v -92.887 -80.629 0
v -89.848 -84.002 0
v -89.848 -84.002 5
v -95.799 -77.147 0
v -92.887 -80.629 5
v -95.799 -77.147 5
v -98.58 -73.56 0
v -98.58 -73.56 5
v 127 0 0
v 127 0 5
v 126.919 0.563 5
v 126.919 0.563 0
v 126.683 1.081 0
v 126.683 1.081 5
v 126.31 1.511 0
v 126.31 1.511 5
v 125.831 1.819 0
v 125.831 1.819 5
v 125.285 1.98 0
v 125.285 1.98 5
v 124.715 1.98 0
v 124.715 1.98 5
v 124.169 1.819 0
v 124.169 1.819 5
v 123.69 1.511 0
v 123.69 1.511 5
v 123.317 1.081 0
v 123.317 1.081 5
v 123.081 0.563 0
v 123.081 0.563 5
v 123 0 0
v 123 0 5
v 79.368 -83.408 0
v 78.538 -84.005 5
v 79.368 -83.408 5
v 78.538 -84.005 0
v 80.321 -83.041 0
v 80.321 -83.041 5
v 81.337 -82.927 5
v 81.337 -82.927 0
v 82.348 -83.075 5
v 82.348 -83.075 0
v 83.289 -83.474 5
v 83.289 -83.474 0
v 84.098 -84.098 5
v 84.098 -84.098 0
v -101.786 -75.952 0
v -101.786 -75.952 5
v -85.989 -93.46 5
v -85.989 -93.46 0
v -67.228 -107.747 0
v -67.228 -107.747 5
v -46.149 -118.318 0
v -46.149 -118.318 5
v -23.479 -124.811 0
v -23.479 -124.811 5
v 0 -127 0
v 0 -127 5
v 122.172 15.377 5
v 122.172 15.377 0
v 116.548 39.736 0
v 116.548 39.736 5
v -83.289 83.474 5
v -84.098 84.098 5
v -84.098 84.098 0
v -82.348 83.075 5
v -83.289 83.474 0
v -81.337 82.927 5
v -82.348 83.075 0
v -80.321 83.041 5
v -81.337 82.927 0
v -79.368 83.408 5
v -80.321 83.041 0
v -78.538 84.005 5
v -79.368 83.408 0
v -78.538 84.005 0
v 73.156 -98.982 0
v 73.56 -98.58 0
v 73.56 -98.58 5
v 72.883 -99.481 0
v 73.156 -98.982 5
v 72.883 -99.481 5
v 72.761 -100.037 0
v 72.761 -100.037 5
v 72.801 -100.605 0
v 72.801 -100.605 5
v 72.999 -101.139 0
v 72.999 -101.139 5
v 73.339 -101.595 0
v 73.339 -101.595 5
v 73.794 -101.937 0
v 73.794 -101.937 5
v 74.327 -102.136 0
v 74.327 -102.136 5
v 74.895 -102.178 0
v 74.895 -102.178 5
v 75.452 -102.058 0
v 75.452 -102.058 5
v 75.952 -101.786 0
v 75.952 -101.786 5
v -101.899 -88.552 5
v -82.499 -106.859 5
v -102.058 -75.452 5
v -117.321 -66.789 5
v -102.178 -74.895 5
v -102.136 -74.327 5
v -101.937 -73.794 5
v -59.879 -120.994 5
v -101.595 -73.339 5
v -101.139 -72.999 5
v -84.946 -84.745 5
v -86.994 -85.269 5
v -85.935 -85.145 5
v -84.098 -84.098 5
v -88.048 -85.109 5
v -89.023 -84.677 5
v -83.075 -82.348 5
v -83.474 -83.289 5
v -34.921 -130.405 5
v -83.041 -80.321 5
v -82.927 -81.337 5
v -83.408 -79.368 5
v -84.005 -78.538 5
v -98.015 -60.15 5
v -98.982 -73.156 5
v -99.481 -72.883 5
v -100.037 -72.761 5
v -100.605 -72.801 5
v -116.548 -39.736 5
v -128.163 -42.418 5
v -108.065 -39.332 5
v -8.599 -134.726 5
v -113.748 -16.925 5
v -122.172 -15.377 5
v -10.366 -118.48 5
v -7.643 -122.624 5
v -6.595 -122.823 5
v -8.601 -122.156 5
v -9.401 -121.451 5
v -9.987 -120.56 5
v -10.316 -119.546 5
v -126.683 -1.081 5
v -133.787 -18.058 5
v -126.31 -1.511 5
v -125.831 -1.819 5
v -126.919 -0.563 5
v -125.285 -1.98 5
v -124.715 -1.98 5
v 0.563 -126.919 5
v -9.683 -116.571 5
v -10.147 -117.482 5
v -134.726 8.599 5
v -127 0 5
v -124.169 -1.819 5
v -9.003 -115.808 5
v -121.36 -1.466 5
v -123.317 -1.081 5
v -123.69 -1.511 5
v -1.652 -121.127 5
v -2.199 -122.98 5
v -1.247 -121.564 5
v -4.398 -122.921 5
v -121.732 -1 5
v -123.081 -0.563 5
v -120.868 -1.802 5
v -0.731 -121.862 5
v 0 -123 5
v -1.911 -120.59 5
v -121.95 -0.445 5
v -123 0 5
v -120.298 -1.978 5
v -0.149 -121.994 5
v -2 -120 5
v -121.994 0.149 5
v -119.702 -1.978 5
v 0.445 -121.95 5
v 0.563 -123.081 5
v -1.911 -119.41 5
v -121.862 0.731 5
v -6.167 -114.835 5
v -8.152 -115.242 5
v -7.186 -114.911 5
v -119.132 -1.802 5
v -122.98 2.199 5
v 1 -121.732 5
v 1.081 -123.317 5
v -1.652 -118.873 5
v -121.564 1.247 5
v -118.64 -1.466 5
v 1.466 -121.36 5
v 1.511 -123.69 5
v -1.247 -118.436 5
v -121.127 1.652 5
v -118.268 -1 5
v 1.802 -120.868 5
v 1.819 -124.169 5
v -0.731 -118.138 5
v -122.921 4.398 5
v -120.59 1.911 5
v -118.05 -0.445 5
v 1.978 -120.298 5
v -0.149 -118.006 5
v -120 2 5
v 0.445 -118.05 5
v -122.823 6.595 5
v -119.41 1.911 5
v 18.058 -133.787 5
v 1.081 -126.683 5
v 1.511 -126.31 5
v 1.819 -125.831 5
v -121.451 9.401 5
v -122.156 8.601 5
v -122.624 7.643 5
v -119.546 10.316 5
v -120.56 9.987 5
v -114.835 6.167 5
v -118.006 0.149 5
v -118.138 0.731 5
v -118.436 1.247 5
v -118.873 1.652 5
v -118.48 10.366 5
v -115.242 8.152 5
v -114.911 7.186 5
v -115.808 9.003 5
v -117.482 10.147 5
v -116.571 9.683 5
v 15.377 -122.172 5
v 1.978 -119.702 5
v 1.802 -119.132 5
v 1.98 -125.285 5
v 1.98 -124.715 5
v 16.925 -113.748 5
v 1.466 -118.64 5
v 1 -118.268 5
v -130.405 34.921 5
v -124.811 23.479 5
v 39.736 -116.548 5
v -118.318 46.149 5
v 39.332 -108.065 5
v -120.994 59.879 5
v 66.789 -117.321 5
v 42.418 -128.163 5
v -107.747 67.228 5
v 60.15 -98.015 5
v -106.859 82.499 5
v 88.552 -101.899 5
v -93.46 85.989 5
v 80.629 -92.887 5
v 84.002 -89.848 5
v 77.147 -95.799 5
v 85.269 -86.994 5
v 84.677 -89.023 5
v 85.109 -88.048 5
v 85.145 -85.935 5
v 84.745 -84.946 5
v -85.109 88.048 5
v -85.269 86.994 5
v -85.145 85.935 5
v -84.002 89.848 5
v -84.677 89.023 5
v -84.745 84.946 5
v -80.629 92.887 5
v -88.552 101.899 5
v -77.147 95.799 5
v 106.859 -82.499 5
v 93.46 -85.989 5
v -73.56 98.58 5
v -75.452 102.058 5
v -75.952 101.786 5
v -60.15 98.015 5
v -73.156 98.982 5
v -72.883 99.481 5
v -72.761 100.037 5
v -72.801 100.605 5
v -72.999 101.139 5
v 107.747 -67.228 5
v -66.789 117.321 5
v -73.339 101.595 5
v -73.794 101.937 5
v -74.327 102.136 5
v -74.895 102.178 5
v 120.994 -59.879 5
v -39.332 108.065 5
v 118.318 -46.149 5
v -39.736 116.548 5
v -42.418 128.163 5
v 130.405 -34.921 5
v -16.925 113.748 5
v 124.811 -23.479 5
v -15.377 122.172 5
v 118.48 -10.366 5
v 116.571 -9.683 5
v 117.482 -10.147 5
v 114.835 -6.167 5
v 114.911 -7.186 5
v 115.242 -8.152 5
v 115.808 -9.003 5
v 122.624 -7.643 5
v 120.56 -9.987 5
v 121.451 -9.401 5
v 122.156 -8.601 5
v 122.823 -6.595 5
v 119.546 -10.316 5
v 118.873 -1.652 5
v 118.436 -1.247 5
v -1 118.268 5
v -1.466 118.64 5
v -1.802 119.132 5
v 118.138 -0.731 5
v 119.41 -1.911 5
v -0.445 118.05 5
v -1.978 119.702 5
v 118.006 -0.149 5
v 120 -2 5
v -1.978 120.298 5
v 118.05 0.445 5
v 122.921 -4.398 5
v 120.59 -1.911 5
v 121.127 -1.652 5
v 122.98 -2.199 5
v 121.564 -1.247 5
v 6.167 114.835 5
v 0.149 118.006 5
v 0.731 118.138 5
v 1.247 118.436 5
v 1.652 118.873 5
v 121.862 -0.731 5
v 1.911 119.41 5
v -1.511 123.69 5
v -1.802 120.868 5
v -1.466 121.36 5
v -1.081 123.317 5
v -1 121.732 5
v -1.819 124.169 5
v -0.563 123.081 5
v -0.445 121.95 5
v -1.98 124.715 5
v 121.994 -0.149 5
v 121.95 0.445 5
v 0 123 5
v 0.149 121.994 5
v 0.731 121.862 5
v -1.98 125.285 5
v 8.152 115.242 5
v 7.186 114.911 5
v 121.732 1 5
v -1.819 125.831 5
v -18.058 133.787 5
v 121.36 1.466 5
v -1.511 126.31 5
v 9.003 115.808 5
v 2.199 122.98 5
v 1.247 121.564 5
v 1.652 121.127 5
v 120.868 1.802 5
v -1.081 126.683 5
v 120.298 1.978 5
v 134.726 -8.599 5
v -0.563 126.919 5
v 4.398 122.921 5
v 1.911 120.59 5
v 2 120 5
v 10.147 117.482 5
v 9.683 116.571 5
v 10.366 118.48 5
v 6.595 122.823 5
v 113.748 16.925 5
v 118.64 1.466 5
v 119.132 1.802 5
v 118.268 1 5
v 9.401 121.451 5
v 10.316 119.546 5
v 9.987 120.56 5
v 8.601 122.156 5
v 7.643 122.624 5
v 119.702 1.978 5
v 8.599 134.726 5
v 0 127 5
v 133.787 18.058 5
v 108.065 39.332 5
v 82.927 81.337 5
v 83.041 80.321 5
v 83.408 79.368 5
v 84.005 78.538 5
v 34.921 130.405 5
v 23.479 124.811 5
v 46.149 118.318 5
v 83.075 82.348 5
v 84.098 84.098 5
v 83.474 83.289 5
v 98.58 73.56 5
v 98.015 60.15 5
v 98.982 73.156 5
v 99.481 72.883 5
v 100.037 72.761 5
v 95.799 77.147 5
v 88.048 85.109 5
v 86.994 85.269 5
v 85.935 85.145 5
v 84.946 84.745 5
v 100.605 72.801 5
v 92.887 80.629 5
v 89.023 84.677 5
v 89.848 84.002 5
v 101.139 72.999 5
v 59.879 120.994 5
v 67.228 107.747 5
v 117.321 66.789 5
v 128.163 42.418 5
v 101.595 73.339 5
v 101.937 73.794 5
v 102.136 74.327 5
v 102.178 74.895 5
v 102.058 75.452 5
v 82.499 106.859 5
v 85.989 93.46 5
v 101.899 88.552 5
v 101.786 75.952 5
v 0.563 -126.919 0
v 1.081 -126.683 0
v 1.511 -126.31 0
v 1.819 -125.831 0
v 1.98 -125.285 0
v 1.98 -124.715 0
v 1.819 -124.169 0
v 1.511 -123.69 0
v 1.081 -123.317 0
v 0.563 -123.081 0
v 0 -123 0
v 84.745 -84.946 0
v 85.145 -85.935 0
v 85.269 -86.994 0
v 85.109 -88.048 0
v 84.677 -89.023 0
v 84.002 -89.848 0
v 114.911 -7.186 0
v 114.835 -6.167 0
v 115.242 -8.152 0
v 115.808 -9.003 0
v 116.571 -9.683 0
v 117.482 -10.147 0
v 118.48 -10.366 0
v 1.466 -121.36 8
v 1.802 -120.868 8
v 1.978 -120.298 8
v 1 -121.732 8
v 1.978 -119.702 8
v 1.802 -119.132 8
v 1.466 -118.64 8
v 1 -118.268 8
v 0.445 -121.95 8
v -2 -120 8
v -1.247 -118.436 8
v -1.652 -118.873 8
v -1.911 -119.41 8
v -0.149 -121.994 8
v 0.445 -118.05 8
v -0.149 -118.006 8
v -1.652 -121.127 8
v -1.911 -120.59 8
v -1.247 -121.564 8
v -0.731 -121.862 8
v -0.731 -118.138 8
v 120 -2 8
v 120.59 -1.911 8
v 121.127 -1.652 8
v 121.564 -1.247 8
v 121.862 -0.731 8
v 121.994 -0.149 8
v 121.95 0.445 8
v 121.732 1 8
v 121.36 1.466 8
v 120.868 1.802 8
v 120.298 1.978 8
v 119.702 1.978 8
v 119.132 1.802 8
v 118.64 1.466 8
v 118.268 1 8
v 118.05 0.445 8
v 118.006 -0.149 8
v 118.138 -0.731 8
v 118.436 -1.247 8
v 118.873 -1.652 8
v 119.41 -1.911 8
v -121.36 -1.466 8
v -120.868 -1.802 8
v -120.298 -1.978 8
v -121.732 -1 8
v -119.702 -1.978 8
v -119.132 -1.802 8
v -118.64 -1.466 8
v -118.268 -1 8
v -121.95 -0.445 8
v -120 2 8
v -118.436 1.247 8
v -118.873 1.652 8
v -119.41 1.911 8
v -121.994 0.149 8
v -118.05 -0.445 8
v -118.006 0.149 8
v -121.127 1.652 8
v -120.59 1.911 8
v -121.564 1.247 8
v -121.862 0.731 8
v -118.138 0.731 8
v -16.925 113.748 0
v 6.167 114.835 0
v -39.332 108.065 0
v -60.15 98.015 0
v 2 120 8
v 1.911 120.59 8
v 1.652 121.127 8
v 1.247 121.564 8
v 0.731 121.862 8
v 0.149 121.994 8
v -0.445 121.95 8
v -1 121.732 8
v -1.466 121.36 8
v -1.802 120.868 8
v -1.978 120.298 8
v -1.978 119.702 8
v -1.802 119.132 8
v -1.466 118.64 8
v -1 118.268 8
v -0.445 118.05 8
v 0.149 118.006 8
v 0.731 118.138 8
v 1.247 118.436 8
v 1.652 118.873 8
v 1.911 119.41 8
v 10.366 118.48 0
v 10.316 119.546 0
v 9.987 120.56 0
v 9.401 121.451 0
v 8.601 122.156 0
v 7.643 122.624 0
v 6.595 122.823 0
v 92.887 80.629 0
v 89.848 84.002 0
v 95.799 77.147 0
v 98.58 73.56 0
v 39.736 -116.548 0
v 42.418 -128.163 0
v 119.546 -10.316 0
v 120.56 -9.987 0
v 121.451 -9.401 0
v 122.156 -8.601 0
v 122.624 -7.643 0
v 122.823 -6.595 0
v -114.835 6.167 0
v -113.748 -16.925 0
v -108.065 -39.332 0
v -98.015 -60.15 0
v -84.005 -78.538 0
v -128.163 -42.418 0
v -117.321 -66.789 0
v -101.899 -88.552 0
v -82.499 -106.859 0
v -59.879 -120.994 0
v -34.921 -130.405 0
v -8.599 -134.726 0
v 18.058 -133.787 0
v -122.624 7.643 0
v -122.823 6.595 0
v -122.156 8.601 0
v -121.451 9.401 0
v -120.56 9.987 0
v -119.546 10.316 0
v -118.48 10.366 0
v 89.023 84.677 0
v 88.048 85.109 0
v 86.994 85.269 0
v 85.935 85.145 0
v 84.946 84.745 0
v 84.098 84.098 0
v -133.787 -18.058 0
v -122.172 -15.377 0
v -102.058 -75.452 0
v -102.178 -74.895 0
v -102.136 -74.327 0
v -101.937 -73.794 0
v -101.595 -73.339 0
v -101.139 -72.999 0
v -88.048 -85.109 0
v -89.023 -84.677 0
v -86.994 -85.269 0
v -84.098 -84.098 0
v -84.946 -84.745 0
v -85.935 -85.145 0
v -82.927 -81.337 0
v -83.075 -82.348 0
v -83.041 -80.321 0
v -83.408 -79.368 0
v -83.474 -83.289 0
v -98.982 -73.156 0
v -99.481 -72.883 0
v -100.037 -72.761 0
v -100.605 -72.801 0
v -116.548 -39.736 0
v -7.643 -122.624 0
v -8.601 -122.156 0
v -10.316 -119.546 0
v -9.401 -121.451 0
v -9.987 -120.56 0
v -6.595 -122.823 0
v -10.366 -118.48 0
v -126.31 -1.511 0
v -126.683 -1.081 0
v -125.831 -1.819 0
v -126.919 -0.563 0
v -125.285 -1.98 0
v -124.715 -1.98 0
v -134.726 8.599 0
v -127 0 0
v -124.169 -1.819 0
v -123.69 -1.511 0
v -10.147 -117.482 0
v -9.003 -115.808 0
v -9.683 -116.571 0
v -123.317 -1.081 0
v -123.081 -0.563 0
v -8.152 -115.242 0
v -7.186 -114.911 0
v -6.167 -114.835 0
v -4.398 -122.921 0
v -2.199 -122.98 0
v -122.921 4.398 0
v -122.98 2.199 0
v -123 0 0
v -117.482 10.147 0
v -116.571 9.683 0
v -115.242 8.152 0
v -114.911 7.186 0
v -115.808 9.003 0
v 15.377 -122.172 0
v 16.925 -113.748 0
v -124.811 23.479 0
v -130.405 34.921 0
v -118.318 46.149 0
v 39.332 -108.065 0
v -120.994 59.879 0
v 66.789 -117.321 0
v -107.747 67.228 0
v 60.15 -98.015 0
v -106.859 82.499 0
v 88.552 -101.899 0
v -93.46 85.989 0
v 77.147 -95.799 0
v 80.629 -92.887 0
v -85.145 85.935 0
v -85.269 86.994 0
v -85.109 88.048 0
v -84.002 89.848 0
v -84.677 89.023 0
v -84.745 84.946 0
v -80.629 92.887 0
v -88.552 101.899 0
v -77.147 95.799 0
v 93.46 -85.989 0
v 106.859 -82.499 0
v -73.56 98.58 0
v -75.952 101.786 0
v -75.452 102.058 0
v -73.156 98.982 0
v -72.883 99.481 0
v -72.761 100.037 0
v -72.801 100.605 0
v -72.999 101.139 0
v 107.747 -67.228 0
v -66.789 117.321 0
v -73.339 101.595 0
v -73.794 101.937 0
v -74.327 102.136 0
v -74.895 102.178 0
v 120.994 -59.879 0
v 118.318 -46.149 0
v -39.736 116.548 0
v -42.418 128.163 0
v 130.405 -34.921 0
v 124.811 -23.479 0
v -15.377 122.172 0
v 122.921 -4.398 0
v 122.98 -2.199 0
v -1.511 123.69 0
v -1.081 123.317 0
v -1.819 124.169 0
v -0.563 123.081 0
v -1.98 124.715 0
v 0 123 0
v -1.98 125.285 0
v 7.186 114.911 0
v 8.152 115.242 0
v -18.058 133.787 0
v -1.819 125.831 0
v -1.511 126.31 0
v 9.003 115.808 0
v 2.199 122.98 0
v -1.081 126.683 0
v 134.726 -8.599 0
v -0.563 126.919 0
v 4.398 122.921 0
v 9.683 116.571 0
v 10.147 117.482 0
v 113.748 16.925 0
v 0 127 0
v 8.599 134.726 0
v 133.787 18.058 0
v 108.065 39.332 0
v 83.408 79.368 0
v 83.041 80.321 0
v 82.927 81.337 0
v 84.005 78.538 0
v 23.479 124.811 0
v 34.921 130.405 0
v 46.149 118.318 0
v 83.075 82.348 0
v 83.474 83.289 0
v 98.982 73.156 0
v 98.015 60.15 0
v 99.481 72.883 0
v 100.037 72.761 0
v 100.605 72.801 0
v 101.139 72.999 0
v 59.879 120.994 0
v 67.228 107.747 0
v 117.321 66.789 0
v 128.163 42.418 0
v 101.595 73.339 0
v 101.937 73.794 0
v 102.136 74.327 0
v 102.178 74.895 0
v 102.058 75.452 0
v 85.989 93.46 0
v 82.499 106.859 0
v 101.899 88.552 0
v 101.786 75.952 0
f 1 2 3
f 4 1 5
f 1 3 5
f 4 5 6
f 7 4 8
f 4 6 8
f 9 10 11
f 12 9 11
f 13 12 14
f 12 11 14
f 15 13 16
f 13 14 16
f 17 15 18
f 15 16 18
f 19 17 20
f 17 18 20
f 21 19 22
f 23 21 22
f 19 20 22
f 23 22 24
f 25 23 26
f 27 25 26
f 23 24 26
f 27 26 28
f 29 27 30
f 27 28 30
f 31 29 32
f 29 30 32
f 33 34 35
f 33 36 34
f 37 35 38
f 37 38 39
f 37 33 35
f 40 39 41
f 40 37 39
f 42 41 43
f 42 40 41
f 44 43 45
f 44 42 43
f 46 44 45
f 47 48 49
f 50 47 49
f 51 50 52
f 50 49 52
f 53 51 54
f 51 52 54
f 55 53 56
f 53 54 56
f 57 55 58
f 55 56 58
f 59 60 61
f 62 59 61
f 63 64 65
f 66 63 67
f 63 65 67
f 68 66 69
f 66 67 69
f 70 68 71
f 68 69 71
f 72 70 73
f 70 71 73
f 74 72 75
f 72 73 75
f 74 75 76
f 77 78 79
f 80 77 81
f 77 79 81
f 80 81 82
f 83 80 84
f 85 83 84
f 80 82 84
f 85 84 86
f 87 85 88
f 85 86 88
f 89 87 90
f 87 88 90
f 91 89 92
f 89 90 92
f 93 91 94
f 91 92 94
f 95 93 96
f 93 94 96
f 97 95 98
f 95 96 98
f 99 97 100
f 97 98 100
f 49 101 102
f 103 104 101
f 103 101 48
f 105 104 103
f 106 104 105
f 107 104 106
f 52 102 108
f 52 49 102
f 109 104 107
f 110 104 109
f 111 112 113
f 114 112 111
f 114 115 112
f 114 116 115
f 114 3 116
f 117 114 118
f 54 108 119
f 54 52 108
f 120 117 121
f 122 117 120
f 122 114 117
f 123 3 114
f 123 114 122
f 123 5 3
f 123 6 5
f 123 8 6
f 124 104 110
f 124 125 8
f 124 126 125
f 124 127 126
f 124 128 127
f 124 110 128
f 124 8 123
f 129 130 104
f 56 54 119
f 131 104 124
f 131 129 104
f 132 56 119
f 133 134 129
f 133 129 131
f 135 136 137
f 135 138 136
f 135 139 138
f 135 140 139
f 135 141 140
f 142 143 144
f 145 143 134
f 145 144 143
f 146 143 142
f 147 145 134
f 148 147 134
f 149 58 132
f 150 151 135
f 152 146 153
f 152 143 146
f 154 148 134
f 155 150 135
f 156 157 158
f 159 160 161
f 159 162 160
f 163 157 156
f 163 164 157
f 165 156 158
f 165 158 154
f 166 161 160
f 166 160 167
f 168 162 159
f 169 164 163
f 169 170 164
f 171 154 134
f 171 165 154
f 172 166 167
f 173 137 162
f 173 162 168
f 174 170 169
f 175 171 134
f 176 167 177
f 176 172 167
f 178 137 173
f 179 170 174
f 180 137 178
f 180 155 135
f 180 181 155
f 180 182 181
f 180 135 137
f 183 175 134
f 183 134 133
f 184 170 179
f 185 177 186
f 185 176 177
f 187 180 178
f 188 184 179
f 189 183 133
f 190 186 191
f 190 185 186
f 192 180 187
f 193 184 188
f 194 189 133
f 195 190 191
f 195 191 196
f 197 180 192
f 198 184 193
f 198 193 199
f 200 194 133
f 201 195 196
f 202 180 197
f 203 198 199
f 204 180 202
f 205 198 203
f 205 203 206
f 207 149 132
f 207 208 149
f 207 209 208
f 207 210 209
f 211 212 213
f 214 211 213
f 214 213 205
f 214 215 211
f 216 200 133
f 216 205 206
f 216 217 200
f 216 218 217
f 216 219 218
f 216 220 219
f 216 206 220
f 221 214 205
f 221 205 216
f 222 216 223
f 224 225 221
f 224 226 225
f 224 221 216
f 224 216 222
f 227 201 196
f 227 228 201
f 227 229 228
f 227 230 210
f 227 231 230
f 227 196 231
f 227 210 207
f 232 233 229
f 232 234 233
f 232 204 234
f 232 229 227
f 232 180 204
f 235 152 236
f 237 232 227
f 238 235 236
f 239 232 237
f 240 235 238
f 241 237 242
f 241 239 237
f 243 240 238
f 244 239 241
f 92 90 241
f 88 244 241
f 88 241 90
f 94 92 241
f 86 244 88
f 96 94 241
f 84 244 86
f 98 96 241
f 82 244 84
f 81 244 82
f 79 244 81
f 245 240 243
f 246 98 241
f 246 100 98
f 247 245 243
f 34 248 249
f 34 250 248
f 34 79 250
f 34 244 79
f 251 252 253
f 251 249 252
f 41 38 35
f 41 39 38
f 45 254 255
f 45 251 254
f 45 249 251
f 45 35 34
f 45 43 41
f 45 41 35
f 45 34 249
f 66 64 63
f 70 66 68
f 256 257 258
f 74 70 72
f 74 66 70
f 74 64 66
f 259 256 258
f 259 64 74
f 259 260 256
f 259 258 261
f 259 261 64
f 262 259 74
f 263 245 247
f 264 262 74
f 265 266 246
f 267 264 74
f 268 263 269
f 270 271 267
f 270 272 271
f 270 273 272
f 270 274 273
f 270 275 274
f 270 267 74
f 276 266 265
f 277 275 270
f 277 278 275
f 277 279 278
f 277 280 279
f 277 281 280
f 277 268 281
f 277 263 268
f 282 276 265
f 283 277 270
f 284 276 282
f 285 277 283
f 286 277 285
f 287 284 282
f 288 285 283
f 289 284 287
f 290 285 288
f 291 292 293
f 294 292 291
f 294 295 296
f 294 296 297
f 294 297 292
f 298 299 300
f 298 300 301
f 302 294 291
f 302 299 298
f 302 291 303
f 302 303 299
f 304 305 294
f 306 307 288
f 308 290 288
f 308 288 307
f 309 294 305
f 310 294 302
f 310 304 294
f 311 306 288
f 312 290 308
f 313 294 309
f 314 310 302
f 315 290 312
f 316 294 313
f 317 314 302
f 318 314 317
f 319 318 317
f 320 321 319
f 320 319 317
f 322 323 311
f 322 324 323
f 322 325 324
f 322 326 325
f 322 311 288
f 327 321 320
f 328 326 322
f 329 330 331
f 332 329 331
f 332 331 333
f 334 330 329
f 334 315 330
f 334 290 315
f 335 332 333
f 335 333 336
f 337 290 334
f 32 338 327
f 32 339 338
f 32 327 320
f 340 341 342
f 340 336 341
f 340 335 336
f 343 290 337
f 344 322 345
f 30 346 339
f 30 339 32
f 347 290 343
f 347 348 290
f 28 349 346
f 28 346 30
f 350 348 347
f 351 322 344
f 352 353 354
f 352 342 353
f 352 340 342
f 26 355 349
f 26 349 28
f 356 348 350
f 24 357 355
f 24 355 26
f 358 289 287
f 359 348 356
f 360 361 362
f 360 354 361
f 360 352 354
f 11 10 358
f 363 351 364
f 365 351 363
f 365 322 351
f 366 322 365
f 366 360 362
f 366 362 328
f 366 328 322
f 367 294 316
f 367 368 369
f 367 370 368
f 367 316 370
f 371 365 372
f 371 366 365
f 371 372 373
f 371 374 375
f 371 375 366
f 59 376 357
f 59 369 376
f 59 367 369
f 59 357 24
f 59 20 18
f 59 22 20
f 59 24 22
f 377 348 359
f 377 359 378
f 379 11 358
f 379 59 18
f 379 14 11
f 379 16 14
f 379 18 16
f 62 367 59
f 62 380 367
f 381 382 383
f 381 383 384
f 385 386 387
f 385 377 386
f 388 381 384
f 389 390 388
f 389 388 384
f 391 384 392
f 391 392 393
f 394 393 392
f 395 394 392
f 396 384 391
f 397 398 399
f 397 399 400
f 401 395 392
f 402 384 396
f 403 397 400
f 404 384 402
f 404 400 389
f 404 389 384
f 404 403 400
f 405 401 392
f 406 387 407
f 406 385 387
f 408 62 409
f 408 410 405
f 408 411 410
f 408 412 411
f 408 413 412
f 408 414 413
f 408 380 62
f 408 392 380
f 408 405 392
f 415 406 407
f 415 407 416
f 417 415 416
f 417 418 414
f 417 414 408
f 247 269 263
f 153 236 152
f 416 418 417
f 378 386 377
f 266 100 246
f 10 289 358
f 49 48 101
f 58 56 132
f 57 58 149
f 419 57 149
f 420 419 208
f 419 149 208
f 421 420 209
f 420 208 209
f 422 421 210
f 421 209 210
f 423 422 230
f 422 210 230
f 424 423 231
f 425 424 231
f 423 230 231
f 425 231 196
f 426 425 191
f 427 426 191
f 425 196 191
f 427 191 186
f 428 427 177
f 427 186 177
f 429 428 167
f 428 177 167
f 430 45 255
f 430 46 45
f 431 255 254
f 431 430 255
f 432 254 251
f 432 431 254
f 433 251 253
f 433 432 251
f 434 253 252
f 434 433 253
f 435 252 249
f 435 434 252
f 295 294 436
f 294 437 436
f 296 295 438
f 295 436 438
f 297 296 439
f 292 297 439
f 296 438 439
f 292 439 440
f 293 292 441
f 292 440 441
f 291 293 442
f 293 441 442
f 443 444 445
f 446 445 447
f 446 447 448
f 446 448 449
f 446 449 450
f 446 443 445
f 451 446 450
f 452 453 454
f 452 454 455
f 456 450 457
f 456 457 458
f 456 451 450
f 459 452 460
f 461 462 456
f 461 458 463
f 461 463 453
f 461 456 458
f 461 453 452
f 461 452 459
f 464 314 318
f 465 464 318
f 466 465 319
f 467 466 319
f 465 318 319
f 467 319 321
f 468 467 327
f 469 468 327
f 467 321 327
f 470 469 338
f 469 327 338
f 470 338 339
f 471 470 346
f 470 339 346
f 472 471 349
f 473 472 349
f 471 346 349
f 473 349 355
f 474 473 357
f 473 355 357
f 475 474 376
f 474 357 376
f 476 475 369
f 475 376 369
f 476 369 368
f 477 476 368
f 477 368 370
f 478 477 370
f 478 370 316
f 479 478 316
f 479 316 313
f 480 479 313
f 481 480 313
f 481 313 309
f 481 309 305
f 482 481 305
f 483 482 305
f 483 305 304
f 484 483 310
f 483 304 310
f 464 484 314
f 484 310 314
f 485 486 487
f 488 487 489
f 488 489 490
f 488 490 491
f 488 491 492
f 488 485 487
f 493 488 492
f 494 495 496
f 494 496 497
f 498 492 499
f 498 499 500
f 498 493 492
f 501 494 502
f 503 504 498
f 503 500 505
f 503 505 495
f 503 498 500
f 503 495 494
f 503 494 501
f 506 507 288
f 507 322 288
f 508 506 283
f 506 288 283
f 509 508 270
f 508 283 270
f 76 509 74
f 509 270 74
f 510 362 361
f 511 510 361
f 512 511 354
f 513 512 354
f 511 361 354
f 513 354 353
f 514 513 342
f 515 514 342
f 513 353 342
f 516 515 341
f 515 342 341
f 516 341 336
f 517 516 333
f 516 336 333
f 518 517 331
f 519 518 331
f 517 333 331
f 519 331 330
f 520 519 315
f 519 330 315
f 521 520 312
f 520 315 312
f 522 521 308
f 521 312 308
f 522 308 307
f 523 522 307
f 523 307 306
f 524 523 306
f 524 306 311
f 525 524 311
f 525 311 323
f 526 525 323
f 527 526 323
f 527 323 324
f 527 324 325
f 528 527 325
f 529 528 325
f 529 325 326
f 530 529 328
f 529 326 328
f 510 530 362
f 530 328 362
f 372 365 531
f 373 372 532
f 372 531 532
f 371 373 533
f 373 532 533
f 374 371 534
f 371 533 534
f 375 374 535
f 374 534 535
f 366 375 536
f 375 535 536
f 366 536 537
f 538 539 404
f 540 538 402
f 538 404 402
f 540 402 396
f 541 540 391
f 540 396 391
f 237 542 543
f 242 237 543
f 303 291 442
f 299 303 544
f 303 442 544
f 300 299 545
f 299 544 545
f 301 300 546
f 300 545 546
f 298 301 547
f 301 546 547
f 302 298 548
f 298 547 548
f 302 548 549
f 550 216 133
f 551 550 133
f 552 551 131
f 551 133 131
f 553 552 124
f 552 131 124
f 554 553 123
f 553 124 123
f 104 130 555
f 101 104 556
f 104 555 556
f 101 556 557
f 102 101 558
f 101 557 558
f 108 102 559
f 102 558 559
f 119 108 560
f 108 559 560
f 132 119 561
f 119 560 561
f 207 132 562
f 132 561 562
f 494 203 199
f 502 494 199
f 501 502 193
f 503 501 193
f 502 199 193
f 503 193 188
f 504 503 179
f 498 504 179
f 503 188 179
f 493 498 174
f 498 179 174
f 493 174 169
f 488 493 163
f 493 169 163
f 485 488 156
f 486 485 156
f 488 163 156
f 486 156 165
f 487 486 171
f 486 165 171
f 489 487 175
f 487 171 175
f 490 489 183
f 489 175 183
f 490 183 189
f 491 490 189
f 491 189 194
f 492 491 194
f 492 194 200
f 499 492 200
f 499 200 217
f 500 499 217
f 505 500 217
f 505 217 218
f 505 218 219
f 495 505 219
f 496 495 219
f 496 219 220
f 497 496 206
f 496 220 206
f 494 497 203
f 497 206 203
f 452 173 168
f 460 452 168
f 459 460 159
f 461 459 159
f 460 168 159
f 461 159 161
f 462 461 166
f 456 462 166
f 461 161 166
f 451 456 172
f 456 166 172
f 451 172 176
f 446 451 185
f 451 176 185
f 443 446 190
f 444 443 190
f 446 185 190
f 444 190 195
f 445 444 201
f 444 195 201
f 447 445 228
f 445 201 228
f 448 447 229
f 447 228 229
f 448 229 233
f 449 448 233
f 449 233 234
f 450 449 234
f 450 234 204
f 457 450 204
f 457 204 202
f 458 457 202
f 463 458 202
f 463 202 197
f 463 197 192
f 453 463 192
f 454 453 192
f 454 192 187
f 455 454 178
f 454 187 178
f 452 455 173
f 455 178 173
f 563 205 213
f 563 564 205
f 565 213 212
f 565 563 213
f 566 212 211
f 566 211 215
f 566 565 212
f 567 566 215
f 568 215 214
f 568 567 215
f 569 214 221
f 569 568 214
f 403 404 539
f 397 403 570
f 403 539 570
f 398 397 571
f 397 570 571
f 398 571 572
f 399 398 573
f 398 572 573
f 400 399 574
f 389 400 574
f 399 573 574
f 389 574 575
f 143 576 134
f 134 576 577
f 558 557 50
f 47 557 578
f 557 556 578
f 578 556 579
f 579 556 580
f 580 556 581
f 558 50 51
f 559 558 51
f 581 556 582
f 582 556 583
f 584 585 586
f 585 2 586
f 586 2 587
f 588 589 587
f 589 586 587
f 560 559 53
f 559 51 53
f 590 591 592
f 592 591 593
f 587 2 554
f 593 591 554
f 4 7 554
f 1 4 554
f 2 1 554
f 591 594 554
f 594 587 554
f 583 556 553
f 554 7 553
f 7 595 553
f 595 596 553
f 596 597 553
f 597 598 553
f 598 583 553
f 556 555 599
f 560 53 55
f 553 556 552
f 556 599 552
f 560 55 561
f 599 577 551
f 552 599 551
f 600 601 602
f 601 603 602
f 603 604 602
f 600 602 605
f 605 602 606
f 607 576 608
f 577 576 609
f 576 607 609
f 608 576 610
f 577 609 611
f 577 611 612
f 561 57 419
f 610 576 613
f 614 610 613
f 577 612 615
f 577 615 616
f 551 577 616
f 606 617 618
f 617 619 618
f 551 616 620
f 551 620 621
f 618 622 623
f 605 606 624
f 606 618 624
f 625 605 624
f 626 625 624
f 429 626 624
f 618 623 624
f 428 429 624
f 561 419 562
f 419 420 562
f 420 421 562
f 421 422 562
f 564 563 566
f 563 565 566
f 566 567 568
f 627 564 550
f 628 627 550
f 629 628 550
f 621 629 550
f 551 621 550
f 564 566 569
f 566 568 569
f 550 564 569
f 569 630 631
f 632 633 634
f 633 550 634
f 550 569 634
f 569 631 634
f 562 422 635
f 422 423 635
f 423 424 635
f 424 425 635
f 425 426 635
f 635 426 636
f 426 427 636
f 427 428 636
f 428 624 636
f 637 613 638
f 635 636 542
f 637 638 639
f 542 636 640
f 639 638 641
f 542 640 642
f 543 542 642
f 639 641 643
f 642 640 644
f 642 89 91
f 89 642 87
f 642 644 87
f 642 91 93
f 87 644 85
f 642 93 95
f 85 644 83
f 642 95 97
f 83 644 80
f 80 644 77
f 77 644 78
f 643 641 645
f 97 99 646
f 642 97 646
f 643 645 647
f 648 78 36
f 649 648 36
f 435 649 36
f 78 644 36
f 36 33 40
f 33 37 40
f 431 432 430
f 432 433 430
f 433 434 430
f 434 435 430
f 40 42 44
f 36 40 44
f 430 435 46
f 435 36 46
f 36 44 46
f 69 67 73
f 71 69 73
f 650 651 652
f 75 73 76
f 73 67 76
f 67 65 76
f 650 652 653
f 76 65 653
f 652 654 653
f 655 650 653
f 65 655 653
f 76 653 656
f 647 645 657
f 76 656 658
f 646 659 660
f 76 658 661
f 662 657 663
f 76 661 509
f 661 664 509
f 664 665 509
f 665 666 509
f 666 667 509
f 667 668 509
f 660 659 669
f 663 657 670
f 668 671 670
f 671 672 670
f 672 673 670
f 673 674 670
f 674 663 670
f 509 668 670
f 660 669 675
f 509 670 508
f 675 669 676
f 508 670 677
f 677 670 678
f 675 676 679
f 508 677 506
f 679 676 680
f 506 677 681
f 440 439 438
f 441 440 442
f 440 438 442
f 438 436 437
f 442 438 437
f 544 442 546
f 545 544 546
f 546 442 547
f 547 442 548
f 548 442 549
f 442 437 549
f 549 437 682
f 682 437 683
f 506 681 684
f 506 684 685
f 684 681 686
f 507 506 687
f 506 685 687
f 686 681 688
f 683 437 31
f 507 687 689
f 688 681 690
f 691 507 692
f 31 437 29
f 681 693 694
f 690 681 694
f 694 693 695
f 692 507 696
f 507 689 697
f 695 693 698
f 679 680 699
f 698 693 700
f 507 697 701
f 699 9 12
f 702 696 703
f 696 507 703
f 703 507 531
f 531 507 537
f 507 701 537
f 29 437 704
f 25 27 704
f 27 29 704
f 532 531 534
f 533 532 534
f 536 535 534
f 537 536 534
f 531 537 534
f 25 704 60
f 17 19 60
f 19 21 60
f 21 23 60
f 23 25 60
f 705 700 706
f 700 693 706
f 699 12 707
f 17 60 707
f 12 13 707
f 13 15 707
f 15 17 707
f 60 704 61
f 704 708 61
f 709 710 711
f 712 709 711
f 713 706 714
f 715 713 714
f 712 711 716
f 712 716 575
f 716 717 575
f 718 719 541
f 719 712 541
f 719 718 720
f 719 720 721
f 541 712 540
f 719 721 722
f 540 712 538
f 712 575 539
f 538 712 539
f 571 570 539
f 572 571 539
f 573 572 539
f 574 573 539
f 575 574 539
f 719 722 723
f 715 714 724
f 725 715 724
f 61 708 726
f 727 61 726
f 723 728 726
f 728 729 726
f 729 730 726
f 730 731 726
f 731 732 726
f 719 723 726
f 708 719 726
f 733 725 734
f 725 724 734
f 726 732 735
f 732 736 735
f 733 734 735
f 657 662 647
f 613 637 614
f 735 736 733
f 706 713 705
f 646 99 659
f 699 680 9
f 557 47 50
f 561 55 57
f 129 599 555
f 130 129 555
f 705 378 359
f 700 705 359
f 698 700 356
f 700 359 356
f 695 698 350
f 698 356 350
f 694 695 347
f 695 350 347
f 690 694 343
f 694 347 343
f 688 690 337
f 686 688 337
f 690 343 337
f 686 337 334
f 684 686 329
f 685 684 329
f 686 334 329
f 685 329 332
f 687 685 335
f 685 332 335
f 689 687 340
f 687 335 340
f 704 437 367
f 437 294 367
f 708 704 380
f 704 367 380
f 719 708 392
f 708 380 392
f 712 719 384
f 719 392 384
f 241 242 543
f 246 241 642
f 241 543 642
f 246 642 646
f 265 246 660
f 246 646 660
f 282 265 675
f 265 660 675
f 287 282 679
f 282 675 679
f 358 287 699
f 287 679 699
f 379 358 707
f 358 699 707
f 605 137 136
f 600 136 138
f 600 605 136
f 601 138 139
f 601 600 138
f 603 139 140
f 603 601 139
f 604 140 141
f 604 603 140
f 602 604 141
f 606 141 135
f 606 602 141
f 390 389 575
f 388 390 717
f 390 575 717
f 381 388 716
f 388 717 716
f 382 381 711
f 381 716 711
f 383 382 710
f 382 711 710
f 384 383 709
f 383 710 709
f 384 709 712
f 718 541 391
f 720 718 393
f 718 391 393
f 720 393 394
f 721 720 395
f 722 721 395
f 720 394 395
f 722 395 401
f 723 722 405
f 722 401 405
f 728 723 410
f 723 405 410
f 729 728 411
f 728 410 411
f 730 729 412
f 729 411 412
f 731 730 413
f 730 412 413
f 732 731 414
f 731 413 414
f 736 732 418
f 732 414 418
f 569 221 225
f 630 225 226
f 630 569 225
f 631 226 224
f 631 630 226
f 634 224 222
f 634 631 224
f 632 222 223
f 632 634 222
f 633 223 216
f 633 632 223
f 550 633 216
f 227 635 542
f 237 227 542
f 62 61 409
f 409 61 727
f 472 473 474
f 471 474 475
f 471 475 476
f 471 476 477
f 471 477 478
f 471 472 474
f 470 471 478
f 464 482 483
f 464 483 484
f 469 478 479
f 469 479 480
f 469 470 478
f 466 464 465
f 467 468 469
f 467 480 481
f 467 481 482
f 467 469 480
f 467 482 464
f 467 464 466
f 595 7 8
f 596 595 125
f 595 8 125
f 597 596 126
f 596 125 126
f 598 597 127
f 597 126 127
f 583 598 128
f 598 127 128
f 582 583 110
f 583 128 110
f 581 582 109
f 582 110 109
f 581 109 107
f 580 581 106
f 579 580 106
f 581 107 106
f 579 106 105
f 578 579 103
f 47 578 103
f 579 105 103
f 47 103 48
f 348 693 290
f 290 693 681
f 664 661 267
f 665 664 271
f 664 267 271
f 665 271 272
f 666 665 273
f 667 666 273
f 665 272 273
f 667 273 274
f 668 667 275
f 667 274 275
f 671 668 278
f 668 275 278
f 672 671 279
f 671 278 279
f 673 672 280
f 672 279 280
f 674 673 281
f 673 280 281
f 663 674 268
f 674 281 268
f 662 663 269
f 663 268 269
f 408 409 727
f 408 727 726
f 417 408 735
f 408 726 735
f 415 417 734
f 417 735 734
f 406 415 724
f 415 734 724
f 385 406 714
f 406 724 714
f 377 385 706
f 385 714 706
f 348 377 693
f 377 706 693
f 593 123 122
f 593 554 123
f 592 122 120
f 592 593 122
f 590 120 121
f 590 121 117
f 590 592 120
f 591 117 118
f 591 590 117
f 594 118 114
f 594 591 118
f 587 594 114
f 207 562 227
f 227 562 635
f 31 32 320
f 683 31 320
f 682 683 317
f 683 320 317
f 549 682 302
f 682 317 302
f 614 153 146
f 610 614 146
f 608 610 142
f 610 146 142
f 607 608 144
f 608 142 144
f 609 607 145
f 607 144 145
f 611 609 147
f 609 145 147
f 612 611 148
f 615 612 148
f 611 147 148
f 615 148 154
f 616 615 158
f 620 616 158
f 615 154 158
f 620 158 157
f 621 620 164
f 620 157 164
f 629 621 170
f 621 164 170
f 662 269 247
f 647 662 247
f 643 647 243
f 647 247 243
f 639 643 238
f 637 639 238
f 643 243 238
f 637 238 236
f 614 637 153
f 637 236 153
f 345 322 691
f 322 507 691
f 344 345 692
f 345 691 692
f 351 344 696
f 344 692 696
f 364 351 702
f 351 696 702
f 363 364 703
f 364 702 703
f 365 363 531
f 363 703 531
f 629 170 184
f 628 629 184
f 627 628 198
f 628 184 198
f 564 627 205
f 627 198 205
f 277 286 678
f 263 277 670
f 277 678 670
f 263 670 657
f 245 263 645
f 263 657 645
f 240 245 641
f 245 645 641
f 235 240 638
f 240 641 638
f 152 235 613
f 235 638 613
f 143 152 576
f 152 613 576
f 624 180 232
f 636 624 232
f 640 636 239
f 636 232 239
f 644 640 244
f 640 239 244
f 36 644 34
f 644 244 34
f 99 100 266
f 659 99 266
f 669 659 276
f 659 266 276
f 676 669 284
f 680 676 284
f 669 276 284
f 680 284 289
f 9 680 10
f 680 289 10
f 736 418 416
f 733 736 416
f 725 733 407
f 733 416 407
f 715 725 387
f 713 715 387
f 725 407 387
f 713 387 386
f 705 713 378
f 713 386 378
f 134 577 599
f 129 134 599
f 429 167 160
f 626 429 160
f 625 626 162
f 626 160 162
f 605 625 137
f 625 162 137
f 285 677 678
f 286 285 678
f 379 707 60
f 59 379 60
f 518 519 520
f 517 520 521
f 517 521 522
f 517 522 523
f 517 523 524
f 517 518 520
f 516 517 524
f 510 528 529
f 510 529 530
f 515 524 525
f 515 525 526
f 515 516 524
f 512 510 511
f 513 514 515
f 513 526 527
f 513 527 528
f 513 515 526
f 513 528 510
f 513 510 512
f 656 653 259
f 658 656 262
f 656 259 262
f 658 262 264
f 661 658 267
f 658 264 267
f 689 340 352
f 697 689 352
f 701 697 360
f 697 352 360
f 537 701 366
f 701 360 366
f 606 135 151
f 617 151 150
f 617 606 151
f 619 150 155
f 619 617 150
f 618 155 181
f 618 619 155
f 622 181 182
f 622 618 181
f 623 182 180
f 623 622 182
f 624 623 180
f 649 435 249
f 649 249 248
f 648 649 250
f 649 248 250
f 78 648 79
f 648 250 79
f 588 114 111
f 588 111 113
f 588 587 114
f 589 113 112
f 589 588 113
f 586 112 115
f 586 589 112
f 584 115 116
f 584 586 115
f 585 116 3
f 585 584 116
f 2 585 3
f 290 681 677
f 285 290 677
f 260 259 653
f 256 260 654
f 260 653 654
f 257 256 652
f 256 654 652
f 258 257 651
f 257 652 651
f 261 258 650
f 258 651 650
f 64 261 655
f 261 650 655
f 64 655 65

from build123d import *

# Parameters (mm, degrees)
SCHIZZO1_R                   = 135
ESTRUSIONE_ESTRUSIONE1_DEPTH = 5
SCHIZZO2_R                   = 115
TAGLIO_ESTRUSIONE1_DEPTH     = 191.984292548
SCHIZZO3_R                   = 2
ESTRUSIONE_ESTRUSIONE2_DEPTH = 3
RIPETIZIONECIRCOLARE1_COUNT  = 4
TAGLIO_ESTRUSIONE2_DEPTH     = 10
RIPETIZIONECIRCOLARE2_COUNT  = 4
TAGLIO_ESTRUSIONE21_DEPTH    = 8
RIPETIZIONECIRCOLARE3_COUNT  = 4
TAGLIO_ESTRUSIONE23_DEPTH    = 10
RIPETIZIONECIRCOLARE5_COUNT  = 4
RACCORDO1_R                  = 4
RACCORDO2_R                  = 4


with BuildPart() as part:
    # Schizzo1 → Estrusione-Estrusione1 (new body)
    with BuildSketch(Plane.XY):
        Circle(SCHIZZO1_R)
    extrude(amount=ESTRUSIONE_ESTRUSIONE1_DEPTH)

    # Schizzo2 → Taglio-Estrusione1 (cut, through all)
    with BuildSketch(Plane.XY.offset(5)):
        Circle(SCHIZZO2_R)
    extrude(amount=-TAGLIO_ESTRUSIONE1_DEPTH, mode=Mode.SUBTRACT)

    # Schizzo3 → Estrusione-Estrusione2 (add)
    with BuildSketch(Plane.XY.offset(5)):
        with Locations((0, 120)):
            Circle(SCHIZZO3_R)
    estrusione_estrusione2 = extrude(amount=ESTRUSIONE_ESTRUSIONE2_DEPTH)

    # RipetizioneCircolare1: Estrusione-Estrusione2 ×4 about axis
    ripetizionecircolare1_axis = Axis((0, 0, 0), (0, 0, 1))
    for i in range(1, RIPETIZIONECIRCOLARE1_COUNT):
        add(estrusione_estrusione2.rotate(ripetizionecircolare1_axis, i * 360 / RIPETIZIONECIRCOLARE1_COUNT))

    # Schizzo5 → Taglio-Estrusione2 (cut)
    with BuildSketch(Plane.XY.offset(5)):
        with BuildLine():
            ThreePointArc((-101.785752557, -75.95169897), (-56.934761924, -113.522829795), (0, -127))
            ThreePointArc((0, -127), (2, -125), (0, -123))
            ThreePointArc((0, -123), (-55.141541076, -109.947307596), (-98.579902083, -73.559519475))
            ThreePointArc((-98.579902083, -73.559519475), (-101.378917067, -73.152683985), (-101.785752557, -75.95169897))
        make_face()
    taglio_estrusione2 = extrude(amount=-TAGLIO_ESTRUSIONE2_DEPTH, mode=Mode.SUBTRACT)

    # RipetizioneCircolare2: Taglio-Estrusione2 ×4 about axis
    ripetizionecircolare2_axis = Axis((0, 0, 0), (0, 0, 1))
    for i in range(1, RIPETIZIONECIRCOLARE2_COUNT):
        add(taglio_estrusione2.rotate(ripetizionecircolare2_axis, i * 360 / RIPETIZIONECIRCOLARE2_COUNT), mode=Mode.SUBTRACT)

    # Schizzo14 → Taglio-Estrusione21 (cut)
    with BuildSketch(Plane.XY):
        Polygon((-39.736129967, 116.548444757), (-45.359906326, 140.907696377), (-21.000654706, 146.531472735), (-15.376878347, 122.172221115), align=None)
    taglio_estrusione21 = extrude(amount=TAGLIO_ESTRUSIONE21_DEPTH, mode=Mode.SUBTRACT)

    # RipetizioneCircolare3: Taglio-Estrusione21 ×4 about axis
    ripetizionecircolare3_axis = Axis((0, 0, 0), (0, 0, 1))
    for i in range(1, RIPETIZIONECIRCOLARE3_COUNT):
        add(taglio_estrusione21.rotate(ripetizionecircolare3_axis, i * 360 / RIPETIZIONECIRCOLARE3_COUNT), mode=Mode.SUBTRACT)

    # Schizzo15 → Taglio-Estrusione23 (cut)
    with BuildSketch(Plane.XY.offset(5)):
        with BuildLine():
            Line((-86.974134086, 86.974134086), (-81.317279836, 81.317279836))
            ThreePointArc((-81.317279836, 81.317279836), (-104.225395509, 48.6011001), (-114.562390281, 10.022910416))
            Line((-114.562390281, 10.022910416), (-122.531947865, 10.720156358))
            ThreePointArc((-122.531947865, 10.720156358), (-111.475857806, 51.982046194), (-86.974134086, 86.974134086))
        make_face()
    taglio_estrusione23 = extrude(amount=-TAGLIO_ESTRUSIONE23_DEPTH, mode=Mode.SUBTRACT)

    # RipetizioneCircolare5: Taglio-Estrusione23 ×4 about axis
    ripetizionecircolare5_axis = Axis((0, 0, 5), (0, 0, 1))
    for i in range(1, RIPETIZIONECIRCOLARE5_COUNT):
        add(taglio_estrusione23.rotate(ripetizionecircolare5_axis, i * 360 / RIPETIZIONECIRCOLARE5_COUNT), mode=Mode.SUBTRACT)

    # Raccordo1
    raccordo1_edges = [part.edges().sort_by_distance(p)[0] for p in [
        (-114.562390281, 10.022910416, 2.5),
        (-122.531947865, 10.720156358, 2.5),
    ]]
    fillet(raccordo1_edges, radius=RACCORDO1_R - 0.0001)  # a hair under: the kernel refuses the full size

    # Raccordo2
    raccordo2_edges = [part.edges().sort_by_distance(p)[0] for p in [
        (-81.317279836, -81.317279836, 2.5),
        (-86.974134086, -86.974134086, 2.5),
        (-10.022910416, -114.562390281, 2.5),
        (-10.720156358, -122.531947865, 2.5),
        (86.974134086, -86.974134086, 2.5),
        (81.317279836, -81.317279836, 2.5),
        (114.562390281, -10.022910416, 2.5),
        (122.531947865, -10.720156358, 2.5),
        (86.974134086, 86.974134086, 2.5),
        (81.317279836, 81.317279836, 2.5),
        (10.720156358, 122.531947865, 2.5),
        (10.022910416, 114.562390281, 2.5),
        (-81.317279836, 81.317279836, 2.5),
        (-86.974134086, 86.974134086, 2.5),
    ]]
    fillet(raccordo2_edges, radius=RACCORDO2_R - 0.0001)  # a hair under: the kernel refuses the full size


solid = part.part
